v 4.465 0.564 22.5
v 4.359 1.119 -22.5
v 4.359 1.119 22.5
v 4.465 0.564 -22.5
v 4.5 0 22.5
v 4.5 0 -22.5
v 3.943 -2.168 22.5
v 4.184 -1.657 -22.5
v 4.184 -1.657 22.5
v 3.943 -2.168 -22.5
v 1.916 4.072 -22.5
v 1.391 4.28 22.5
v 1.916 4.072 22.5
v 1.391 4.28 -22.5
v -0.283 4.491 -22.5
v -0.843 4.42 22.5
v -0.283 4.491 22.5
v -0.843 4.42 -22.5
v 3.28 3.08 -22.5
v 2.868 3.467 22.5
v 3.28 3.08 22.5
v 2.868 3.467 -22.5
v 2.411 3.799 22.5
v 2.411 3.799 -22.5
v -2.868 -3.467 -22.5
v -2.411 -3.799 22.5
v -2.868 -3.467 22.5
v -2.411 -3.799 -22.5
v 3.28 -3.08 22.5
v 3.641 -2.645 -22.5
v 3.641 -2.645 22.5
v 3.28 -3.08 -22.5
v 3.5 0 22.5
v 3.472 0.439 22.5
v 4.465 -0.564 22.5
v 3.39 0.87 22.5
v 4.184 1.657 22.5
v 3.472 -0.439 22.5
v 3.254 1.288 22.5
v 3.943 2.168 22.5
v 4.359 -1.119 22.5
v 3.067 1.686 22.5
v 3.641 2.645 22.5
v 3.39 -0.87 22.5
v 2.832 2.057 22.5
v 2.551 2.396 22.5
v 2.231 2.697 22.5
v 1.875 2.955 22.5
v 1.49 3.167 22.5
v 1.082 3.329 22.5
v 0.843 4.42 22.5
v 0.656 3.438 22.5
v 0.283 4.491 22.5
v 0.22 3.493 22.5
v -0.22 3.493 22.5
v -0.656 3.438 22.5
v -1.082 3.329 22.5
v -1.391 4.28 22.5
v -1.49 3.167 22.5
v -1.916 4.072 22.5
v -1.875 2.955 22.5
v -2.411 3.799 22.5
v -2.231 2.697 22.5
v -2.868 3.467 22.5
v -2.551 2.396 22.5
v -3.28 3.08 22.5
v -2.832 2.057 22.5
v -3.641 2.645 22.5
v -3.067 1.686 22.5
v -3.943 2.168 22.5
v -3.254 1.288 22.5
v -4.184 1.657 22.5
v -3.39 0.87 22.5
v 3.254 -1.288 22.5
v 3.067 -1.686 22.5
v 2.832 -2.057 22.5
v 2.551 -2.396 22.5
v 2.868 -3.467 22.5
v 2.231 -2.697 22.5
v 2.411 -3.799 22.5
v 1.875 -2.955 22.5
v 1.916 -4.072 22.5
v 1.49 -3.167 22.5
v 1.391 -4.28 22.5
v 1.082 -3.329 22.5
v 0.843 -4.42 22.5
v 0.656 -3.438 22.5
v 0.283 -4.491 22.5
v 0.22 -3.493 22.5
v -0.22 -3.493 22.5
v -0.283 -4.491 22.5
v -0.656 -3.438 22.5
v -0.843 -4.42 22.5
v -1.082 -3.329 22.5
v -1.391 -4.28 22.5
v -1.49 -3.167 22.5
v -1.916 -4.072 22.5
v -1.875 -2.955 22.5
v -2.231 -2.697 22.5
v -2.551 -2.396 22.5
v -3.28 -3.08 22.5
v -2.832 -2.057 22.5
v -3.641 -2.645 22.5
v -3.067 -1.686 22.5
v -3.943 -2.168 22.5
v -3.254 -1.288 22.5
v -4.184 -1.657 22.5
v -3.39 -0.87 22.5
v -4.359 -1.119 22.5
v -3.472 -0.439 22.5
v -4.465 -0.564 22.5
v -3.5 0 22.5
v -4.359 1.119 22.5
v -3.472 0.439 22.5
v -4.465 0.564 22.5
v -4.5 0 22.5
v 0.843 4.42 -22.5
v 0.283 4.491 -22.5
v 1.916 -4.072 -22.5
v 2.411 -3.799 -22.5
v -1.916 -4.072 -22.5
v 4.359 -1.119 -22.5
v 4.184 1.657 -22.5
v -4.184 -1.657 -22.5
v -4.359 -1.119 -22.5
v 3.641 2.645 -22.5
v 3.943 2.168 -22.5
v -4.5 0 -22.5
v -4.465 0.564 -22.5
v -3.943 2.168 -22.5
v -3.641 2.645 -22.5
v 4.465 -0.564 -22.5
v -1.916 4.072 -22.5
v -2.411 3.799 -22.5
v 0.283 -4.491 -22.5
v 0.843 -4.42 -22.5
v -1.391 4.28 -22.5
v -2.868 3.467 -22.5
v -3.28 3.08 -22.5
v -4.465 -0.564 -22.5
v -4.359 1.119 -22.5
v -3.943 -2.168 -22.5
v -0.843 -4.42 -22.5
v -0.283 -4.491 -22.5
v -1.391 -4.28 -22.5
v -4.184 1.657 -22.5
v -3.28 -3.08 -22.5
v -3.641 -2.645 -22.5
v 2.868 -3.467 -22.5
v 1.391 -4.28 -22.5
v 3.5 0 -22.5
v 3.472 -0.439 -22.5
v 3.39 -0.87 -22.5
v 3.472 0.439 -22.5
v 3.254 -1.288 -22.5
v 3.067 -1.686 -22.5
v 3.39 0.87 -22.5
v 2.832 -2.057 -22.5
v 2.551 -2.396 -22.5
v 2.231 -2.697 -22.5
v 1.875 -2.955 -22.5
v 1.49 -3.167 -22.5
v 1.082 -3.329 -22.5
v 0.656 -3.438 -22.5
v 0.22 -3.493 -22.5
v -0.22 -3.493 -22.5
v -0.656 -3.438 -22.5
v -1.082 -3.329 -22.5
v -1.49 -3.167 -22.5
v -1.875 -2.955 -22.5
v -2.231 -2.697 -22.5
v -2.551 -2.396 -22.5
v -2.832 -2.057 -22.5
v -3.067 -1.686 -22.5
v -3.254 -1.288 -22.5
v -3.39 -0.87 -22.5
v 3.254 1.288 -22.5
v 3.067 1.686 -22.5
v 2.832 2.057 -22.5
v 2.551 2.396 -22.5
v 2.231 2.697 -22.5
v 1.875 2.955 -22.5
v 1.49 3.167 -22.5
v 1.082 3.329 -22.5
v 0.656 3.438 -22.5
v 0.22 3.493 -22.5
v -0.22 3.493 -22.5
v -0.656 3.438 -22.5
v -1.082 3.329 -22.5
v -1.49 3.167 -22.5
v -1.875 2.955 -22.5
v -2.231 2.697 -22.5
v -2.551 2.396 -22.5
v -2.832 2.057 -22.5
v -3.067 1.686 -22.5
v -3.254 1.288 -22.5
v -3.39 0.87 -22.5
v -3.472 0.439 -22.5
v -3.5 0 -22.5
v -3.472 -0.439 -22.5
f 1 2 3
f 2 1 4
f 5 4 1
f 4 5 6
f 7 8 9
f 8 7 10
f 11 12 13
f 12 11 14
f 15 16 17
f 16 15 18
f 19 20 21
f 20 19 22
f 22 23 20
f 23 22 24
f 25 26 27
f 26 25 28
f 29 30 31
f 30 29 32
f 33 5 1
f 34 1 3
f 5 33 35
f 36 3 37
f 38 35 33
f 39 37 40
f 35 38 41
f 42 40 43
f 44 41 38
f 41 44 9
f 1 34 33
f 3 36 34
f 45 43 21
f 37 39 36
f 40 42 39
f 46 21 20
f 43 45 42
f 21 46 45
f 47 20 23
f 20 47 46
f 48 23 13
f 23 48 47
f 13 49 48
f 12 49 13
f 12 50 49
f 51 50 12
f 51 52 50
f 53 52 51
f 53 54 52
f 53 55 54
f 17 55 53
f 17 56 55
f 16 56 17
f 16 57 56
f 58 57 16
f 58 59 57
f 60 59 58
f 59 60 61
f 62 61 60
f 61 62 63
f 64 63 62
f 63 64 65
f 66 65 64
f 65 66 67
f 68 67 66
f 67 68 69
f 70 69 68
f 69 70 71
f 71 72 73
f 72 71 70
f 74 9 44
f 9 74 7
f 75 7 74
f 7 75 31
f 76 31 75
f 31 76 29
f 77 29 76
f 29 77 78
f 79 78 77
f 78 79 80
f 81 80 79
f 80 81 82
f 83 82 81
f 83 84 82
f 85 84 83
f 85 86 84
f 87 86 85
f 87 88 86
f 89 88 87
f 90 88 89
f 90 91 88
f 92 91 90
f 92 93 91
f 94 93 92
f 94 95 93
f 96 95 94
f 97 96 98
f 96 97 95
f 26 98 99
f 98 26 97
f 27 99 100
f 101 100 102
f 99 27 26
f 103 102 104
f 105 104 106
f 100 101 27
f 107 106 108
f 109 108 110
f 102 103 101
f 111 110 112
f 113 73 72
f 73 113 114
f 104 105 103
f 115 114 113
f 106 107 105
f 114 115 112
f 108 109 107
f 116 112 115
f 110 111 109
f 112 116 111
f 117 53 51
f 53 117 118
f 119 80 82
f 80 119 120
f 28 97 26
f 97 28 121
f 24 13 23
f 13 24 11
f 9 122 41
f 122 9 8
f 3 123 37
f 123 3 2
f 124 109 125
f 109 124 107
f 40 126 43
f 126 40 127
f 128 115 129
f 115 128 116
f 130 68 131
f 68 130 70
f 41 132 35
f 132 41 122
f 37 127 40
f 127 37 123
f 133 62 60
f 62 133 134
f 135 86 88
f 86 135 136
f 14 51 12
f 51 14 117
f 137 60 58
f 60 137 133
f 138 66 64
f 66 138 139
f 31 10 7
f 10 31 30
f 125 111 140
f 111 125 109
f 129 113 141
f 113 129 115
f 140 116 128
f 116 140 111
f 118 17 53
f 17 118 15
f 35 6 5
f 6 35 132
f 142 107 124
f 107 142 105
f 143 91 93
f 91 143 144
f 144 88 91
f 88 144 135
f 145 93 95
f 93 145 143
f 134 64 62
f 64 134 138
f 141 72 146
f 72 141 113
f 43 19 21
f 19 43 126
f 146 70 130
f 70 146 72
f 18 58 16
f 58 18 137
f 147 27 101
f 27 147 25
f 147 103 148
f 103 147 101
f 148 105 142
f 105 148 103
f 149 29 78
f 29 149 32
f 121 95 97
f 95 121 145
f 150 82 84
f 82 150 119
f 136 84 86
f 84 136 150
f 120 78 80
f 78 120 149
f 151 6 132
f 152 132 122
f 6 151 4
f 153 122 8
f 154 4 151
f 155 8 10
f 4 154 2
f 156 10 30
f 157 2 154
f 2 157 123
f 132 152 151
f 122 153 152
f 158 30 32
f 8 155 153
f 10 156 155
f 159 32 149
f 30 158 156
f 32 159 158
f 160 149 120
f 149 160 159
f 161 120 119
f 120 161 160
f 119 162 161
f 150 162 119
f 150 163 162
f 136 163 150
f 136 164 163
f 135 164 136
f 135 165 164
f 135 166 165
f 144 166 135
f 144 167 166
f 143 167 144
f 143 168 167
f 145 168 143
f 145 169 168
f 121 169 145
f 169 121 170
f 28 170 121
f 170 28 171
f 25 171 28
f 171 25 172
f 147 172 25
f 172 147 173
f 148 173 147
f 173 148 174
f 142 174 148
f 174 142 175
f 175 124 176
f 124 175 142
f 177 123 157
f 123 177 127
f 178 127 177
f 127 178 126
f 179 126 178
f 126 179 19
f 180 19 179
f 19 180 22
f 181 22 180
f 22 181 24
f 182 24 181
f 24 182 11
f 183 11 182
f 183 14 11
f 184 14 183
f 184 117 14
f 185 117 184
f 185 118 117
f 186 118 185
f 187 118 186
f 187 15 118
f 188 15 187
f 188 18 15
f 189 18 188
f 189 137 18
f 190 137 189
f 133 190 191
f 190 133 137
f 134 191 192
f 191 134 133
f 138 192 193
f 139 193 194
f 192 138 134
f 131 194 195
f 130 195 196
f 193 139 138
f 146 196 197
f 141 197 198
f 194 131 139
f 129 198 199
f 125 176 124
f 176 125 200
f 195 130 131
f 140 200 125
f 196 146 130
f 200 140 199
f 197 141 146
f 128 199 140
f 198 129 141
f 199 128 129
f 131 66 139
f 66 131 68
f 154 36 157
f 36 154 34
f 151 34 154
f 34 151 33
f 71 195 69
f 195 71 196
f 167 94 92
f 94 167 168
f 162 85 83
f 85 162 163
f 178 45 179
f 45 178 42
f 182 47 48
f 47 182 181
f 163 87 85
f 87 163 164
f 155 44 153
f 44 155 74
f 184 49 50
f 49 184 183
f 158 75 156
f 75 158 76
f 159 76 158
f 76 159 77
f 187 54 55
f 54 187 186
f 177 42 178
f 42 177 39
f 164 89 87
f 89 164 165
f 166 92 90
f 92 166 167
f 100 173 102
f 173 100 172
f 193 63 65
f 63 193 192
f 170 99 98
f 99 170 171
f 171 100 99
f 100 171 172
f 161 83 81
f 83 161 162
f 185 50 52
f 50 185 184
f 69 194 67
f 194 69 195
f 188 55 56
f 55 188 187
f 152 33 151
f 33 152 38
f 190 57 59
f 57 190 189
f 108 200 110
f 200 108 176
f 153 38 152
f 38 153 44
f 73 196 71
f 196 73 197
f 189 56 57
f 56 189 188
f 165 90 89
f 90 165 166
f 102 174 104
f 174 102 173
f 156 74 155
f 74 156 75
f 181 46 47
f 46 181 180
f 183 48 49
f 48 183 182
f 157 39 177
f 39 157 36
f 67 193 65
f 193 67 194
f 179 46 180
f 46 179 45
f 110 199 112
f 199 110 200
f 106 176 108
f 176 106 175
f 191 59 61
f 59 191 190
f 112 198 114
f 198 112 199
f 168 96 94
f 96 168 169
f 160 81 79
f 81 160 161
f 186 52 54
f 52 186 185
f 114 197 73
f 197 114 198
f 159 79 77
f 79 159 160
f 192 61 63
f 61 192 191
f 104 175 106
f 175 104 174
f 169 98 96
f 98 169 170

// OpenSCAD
$fn = 50;


difference() {
	union() {
		translate(v = [0, 0, -22.5000000000]) {
			cylinder(h = 45, r = 4.5000000000);
		}
	}
	union() {
		translate(v = [0, 0, -100.0000000000]) {
			cylinder(h = 200, r = 3.5000000000);
		}
	}
}
